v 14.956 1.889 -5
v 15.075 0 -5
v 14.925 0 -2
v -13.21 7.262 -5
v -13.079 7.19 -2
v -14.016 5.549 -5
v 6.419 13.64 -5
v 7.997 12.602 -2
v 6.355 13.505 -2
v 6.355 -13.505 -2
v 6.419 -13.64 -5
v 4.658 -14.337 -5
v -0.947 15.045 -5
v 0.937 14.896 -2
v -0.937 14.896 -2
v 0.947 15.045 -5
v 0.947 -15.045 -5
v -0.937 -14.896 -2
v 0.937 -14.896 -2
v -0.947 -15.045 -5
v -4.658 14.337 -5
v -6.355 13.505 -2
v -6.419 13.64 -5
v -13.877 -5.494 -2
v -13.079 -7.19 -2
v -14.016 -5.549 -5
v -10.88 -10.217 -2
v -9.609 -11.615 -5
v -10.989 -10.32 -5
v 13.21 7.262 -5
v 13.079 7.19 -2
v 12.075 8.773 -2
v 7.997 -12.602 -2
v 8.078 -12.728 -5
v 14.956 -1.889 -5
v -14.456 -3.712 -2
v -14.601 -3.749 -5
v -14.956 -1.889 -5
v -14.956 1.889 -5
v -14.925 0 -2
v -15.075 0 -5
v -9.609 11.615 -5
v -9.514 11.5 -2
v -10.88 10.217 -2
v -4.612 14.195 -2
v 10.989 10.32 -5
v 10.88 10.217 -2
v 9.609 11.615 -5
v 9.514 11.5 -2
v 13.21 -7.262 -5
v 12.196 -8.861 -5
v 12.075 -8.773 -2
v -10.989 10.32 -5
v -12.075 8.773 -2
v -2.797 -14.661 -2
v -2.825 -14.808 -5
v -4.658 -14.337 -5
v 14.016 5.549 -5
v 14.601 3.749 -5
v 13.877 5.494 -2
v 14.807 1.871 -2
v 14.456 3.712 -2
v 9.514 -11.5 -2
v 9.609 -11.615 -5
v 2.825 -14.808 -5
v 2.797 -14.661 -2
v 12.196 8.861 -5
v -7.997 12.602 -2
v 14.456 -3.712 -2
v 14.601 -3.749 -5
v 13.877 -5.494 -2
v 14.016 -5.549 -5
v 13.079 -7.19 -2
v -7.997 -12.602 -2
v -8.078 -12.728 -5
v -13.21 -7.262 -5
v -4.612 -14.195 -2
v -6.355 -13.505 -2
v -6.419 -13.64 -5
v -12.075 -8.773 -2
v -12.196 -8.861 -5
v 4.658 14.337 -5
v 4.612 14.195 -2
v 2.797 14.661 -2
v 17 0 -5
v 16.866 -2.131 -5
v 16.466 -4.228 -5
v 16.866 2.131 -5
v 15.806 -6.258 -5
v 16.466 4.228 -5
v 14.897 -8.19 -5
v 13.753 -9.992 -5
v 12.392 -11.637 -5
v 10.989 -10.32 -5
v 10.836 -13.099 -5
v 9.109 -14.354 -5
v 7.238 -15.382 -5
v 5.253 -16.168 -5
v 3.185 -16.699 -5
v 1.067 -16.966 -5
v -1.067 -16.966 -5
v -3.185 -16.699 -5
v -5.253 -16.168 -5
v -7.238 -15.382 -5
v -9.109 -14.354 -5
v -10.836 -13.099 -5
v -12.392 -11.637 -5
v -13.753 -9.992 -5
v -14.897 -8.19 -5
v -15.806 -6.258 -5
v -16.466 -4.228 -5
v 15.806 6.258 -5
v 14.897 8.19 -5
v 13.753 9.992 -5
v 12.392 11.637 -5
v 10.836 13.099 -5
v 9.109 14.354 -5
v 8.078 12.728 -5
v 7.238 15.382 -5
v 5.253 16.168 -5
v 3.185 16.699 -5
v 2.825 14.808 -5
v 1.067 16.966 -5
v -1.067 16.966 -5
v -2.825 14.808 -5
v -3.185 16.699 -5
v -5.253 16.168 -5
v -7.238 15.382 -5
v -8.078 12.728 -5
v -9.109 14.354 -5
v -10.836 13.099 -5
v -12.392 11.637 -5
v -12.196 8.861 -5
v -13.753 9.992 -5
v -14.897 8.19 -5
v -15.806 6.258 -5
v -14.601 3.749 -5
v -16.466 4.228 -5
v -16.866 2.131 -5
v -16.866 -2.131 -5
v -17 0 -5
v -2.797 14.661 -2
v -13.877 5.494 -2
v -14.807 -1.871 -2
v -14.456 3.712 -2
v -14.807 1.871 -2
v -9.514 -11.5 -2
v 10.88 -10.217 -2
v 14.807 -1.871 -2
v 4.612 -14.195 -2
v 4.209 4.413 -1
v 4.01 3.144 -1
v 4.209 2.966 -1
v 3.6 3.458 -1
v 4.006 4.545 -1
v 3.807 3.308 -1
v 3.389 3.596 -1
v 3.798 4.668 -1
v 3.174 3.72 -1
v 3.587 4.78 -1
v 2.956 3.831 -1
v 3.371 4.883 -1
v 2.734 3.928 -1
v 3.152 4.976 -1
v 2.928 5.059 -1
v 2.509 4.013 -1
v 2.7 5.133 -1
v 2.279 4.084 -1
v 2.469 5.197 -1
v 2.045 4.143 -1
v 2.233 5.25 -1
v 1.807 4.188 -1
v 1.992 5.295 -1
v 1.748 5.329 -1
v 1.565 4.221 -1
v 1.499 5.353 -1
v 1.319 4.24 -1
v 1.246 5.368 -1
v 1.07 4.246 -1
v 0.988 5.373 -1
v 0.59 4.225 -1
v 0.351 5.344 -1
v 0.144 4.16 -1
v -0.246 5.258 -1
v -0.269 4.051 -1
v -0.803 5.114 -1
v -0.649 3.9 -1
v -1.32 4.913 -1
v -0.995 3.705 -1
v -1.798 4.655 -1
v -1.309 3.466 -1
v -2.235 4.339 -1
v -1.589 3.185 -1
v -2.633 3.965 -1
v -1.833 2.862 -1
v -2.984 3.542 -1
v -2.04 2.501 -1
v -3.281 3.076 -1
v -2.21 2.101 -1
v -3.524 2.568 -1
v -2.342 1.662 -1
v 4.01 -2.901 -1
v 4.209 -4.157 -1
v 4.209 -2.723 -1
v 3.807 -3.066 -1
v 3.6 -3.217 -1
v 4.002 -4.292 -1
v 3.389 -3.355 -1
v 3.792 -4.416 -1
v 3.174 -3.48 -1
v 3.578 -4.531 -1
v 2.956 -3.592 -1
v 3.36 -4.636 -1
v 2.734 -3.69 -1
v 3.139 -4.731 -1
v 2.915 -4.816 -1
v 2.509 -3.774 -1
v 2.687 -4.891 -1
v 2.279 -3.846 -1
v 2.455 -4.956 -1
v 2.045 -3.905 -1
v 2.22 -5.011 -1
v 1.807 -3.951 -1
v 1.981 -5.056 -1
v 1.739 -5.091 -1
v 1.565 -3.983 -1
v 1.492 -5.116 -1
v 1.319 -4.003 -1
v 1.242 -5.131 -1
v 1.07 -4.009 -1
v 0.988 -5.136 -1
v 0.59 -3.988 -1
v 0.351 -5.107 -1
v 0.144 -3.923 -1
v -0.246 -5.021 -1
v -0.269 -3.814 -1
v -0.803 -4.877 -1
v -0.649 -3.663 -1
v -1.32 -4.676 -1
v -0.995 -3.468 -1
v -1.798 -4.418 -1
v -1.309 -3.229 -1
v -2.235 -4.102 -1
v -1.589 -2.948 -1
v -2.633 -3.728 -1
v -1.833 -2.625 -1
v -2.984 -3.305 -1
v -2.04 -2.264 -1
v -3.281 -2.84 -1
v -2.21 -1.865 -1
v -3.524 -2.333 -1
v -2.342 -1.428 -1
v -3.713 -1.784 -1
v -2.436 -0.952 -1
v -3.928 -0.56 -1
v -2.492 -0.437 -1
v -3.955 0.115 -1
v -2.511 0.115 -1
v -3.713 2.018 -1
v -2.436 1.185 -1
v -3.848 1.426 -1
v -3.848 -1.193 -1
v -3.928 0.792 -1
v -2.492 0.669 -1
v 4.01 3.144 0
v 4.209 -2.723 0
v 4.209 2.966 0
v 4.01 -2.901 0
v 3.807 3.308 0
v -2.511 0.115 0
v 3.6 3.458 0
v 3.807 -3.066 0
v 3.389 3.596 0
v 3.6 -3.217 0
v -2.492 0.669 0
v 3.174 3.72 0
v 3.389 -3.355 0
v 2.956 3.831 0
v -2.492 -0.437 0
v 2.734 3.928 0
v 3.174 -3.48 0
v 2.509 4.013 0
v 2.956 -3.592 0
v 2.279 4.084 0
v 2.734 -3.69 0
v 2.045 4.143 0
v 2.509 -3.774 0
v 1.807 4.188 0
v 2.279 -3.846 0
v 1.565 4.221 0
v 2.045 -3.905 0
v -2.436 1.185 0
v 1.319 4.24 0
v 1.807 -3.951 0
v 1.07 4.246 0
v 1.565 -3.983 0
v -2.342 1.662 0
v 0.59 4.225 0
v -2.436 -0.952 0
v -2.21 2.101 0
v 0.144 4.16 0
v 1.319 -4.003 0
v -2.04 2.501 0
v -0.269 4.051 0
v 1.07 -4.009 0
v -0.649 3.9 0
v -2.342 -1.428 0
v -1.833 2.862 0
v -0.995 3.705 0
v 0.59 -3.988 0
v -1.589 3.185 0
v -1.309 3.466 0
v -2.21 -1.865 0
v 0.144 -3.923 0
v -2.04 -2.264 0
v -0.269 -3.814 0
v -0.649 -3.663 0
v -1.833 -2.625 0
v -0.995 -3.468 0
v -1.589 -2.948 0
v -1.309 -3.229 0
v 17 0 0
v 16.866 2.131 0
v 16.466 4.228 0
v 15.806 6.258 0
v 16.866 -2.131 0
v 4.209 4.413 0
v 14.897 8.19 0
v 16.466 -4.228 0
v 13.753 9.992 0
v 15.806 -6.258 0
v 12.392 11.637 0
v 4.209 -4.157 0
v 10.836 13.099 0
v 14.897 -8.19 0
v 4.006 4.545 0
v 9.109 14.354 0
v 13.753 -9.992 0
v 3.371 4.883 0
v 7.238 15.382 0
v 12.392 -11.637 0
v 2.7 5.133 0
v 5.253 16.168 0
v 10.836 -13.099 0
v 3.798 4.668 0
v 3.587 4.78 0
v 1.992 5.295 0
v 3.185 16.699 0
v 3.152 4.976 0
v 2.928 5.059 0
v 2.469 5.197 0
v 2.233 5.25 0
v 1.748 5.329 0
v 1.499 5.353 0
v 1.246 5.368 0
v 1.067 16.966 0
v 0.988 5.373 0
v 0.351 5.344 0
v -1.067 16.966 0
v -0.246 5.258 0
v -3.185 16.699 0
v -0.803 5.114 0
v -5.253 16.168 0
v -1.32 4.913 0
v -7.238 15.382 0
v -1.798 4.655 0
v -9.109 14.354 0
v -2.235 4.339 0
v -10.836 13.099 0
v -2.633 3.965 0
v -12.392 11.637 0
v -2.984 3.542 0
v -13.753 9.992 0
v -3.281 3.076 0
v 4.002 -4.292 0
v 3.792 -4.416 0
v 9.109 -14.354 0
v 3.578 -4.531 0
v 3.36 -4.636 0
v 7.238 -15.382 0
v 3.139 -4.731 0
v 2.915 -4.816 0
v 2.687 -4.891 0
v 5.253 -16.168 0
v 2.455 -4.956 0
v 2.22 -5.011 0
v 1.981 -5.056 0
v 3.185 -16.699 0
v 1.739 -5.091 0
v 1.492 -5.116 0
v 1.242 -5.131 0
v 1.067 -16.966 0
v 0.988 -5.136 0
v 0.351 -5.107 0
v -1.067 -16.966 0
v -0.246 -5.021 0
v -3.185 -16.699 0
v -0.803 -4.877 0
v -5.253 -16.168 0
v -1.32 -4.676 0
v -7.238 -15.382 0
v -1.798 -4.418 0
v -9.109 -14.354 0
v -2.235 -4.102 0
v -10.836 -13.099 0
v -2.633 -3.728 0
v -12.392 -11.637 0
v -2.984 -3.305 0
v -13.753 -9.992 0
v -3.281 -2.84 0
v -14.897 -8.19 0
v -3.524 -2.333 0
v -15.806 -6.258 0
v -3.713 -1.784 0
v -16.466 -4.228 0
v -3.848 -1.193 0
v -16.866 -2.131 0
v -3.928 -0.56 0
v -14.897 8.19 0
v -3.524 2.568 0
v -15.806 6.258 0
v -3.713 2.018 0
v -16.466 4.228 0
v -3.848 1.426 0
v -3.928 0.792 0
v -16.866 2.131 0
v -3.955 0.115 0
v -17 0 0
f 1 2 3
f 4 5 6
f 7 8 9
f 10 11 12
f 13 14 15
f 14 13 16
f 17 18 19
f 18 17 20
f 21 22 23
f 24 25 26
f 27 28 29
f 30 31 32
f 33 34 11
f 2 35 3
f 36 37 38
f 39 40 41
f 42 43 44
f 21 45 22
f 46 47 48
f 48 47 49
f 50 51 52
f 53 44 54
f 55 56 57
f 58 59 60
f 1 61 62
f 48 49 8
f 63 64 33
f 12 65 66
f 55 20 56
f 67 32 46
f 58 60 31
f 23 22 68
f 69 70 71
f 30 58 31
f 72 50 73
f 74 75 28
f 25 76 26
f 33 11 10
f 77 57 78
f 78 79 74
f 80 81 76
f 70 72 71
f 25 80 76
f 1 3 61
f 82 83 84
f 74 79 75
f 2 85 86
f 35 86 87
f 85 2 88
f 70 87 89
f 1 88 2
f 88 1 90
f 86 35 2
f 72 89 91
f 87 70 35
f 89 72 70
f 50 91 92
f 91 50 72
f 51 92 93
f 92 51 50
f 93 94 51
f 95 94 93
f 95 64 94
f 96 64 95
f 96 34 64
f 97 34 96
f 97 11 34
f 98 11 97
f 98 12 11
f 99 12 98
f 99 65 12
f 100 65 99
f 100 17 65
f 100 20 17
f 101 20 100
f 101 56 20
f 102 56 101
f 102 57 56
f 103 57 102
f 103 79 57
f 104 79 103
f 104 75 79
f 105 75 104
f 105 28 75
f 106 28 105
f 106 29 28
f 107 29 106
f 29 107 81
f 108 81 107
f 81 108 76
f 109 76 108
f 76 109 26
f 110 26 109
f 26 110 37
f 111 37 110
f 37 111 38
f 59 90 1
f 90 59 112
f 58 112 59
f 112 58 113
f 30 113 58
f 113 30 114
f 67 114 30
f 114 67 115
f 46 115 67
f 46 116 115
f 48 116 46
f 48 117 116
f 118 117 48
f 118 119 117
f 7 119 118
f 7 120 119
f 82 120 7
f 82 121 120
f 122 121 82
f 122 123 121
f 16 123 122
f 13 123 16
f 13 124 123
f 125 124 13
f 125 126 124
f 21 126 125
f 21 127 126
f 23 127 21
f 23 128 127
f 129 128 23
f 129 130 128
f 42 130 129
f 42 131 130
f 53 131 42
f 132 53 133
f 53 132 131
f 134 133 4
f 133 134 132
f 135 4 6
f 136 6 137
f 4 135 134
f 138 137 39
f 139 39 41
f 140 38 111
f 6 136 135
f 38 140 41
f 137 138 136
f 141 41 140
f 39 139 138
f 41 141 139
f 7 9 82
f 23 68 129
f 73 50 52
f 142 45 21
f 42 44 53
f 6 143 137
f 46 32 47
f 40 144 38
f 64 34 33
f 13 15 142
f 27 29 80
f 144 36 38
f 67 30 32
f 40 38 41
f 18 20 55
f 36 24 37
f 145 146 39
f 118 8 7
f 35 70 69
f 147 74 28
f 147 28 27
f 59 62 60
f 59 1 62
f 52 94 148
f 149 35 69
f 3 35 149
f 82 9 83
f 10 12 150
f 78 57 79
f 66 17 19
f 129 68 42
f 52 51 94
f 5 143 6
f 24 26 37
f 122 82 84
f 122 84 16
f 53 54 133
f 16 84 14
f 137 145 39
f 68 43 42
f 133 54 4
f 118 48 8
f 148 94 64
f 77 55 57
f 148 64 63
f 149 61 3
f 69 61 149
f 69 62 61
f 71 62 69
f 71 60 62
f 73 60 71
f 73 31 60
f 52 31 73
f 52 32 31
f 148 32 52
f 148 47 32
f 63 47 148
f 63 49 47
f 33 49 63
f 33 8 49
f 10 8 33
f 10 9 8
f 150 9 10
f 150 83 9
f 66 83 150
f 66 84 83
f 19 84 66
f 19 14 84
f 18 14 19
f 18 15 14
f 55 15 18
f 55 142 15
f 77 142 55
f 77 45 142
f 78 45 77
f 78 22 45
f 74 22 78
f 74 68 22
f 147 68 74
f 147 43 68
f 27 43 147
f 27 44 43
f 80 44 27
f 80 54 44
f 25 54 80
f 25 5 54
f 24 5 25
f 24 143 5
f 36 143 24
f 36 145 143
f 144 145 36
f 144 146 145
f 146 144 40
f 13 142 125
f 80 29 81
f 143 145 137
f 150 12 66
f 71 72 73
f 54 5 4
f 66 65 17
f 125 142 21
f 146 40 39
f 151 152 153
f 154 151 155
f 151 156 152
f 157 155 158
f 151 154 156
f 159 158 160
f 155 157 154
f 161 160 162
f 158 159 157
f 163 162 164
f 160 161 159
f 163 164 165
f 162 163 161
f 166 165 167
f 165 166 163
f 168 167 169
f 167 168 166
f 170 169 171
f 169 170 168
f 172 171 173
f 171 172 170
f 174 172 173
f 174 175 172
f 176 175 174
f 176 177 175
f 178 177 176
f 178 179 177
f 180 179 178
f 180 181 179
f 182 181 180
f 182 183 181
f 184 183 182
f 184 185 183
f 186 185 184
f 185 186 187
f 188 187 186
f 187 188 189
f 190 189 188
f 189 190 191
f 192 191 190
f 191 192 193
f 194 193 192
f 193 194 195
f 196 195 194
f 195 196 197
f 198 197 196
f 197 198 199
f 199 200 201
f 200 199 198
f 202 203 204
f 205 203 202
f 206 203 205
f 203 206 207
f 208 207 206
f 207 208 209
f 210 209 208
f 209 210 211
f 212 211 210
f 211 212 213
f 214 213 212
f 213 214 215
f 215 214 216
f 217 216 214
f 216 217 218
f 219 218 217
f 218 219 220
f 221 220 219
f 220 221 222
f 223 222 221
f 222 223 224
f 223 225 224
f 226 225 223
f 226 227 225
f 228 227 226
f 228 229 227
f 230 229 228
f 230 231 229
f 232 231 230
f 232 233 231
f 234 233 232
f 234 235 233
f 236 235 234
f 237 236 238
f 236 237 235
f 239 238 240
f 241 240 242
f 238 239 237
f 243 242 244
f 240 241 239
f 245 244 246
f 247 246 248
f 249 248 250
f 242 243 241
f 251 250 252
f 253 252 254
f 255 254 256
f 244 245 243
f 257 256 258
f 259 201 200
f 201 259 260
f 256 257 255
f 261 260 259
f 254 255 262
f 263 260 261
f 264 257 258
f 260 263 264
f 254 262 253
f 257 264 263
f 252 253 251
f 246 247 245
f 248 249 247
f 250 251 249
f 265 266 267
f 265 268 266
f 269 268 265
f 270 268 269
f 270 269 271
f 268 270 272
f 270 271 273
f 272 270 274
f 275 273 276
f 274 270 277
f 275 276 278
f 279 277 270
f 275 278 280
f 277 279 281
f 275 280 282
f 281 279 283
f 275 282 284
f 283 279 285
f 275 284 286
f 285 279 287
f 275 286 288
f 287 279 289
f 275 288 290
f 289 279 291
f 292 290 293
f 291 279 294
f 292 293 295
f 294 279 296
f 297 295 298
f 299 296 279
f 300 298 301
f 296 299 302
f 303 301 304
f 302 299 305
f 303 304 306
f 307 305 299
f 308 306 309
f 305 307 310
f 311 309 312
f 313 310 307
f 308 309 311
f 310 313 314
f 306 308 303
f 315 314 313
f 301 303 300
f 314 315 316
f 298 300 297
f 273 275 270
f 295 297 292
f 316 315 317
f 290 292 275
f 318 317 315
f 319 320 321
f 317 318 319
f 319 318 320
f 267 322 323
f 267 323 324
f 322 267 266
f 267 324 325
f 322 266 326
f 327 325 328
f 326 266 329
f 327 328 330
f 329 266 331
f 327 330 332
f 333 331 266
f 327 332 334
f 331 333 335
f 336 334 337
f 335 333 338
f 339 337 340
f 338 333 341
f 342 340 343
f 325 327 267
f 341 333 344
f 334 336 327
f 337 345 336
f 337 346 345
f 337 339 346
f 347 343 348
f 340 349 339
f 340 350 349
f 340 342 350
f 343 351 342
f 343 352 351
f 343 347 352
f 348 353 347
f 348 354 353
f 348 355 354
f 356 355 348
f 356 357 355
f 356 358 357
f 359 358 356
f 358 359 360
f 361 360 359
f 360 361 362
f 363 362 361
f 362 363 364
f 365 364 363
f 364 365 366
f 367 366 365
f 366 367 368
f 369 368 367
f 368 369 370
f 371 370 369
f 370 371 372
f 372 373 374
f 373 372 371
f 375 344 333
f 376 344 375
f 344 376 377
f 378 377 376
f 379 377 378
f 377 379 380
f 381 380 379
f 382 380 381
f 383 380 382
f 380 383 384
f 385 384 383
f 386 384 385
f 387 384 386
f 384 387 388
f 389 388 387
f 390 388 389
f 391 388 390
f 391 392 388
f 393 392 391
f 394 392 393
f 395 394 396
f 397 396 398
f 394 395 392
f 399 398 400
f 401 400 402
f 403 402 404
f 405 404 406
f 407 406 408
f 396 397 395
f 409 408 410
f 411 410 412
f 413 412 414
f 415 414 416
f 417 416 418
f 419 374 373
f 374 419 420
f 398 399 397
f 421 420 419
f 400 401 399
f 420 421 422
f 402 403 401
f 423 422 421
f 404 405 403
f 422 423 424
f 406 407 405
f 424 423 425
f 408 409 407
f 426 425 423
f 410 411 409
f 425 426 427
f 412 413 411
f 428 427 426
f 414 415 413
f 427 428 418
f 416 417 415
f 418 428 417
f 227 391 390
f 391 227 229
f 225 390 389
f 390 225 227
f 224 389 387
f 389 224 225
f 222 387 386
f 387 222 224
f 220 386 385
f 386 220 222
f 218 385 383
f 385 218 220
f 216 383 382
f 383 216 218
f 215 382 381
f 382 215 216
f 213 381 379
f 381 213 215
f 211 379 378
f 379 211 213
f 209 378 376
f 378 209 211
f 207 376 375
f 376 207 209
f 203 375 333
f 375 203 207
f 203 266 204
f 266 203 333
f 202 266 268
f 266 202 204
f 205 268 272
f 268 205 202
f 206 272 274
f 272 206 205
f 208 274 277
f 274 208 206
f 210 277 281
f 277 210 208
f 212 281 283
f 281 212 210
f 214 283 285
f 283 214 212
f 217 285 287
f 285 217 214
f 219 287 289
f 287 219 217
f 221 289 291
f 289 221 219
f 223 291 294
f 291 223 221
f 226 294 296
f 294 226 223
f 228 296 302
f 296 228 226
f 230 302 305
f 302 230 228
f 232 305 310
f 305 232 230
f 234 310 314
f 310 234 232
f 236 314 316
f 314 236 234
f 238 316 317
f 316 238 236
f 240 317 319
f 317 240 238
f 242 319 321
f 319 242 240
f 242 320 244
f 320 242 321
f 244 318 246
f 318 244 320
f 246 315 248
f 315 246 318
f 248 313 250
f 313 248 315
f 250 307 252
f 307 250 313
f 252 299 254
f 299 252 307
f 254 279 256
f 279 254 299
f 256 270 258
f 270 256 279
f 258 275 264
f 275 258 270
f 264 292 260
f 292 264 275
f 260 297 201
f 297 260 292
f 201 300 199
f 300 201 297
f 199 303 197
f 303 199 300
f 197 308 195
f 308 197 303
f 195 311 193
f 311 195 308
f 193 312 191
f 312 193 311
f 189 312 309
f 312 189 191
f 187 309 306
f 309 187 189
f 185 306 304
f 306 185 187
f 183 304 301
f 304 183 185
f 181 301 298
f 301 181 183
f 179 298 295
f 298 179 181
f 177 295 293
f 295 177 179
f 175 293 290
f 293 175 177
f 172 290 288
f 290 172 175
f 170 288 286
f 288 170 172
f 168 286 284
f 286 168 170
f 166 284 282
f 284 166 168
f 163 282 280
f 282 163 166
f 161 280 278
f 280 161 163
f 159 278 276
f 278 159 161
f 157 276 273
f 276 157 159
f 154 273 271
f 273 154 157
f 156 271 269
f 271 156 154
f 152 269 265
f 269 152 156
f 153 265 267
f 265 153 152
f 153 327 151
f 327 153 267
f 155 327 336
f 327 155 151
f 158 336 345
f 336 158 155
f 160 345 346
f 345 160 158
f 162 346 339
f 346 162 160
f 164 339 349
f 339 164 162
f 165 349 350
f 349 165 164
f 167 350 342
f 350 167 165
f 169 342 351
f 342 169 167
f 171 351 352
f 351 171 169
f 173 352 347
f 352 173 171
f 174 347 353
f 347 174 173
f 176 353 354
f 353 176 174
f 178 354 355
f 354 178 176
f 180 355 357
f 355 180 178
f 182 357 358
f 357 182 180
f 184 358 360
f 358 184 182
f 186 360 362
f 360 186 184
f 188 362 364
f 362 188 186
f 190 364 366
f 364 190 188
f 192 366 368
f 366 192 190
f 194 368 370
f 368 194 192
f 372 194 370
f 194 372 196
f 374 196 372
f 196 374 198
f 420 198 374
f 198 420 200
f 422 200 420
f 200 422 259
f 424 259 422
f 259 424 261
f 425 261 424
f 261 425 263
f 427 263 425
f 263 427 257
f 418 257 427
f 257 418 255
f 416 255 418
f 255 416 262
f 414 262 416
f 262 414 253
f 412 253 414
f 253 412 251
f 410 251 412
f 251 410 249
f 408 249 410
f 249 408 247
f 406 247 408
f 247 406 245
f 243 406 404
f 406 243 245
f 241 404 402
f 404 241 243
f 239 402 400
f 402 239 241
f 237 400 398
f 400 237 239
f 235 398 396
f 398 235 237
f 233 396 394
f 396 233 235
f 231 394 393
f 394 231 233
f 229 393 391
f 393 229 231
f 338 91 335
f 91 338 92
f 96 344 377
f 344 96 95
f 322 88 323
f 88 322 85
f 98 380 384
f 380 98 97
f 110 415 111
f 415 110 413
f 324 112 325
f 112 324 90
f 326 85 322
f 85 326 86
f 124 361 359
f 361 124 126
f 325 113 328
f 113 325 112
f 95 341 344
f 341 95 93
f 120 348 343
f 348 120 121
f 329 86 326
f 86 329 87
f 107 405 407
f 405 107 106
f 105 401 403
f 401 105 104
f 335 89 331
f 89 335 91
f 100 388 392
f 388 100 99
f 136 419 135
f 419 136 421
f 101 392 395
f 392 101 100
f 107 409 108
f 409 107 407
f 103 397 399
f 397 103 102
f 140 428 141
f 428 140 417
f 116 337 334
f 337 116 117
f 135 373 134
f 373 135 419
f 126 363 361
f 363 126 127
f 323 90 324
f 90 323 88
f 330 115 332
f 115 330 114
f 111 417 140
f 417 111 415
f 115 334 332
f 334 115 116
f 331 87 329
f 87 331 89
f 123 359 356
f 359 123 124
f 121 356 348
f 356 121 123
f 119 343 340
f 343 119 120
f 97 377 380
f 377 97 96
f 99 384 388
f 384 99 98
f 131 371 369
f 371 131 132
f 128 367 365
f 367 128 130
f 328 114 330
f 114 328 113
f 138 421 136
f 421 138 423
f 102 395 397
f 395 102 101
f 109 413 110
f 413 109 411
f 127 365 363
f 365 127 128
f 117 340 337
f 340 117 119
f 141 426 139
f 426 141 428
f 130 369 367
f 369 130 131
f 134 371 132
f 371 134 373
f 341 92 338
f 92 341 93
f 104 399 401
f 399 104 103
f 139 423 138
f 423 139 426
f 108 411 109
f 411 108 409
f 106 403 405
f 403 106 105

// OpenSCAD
$fn = 50;

difference() {
	union() {
		translate(v = [0, 0, -5.0]) {
			cylinder(h = 5, r = 17.0);
		}
	}
	union() {
		#translate(v = [0, 0, -5.0]) {
			cylinder(h = 3, r1 = 15.075, r2 = 14.925);
		}
		translate(v = [0, 0, -1]) {
			linear_extrude(height = 1) {
				text(font = "Impact", halign = "center", size = 10, text = "C", valign = "center");
			}
		}
	}
}
